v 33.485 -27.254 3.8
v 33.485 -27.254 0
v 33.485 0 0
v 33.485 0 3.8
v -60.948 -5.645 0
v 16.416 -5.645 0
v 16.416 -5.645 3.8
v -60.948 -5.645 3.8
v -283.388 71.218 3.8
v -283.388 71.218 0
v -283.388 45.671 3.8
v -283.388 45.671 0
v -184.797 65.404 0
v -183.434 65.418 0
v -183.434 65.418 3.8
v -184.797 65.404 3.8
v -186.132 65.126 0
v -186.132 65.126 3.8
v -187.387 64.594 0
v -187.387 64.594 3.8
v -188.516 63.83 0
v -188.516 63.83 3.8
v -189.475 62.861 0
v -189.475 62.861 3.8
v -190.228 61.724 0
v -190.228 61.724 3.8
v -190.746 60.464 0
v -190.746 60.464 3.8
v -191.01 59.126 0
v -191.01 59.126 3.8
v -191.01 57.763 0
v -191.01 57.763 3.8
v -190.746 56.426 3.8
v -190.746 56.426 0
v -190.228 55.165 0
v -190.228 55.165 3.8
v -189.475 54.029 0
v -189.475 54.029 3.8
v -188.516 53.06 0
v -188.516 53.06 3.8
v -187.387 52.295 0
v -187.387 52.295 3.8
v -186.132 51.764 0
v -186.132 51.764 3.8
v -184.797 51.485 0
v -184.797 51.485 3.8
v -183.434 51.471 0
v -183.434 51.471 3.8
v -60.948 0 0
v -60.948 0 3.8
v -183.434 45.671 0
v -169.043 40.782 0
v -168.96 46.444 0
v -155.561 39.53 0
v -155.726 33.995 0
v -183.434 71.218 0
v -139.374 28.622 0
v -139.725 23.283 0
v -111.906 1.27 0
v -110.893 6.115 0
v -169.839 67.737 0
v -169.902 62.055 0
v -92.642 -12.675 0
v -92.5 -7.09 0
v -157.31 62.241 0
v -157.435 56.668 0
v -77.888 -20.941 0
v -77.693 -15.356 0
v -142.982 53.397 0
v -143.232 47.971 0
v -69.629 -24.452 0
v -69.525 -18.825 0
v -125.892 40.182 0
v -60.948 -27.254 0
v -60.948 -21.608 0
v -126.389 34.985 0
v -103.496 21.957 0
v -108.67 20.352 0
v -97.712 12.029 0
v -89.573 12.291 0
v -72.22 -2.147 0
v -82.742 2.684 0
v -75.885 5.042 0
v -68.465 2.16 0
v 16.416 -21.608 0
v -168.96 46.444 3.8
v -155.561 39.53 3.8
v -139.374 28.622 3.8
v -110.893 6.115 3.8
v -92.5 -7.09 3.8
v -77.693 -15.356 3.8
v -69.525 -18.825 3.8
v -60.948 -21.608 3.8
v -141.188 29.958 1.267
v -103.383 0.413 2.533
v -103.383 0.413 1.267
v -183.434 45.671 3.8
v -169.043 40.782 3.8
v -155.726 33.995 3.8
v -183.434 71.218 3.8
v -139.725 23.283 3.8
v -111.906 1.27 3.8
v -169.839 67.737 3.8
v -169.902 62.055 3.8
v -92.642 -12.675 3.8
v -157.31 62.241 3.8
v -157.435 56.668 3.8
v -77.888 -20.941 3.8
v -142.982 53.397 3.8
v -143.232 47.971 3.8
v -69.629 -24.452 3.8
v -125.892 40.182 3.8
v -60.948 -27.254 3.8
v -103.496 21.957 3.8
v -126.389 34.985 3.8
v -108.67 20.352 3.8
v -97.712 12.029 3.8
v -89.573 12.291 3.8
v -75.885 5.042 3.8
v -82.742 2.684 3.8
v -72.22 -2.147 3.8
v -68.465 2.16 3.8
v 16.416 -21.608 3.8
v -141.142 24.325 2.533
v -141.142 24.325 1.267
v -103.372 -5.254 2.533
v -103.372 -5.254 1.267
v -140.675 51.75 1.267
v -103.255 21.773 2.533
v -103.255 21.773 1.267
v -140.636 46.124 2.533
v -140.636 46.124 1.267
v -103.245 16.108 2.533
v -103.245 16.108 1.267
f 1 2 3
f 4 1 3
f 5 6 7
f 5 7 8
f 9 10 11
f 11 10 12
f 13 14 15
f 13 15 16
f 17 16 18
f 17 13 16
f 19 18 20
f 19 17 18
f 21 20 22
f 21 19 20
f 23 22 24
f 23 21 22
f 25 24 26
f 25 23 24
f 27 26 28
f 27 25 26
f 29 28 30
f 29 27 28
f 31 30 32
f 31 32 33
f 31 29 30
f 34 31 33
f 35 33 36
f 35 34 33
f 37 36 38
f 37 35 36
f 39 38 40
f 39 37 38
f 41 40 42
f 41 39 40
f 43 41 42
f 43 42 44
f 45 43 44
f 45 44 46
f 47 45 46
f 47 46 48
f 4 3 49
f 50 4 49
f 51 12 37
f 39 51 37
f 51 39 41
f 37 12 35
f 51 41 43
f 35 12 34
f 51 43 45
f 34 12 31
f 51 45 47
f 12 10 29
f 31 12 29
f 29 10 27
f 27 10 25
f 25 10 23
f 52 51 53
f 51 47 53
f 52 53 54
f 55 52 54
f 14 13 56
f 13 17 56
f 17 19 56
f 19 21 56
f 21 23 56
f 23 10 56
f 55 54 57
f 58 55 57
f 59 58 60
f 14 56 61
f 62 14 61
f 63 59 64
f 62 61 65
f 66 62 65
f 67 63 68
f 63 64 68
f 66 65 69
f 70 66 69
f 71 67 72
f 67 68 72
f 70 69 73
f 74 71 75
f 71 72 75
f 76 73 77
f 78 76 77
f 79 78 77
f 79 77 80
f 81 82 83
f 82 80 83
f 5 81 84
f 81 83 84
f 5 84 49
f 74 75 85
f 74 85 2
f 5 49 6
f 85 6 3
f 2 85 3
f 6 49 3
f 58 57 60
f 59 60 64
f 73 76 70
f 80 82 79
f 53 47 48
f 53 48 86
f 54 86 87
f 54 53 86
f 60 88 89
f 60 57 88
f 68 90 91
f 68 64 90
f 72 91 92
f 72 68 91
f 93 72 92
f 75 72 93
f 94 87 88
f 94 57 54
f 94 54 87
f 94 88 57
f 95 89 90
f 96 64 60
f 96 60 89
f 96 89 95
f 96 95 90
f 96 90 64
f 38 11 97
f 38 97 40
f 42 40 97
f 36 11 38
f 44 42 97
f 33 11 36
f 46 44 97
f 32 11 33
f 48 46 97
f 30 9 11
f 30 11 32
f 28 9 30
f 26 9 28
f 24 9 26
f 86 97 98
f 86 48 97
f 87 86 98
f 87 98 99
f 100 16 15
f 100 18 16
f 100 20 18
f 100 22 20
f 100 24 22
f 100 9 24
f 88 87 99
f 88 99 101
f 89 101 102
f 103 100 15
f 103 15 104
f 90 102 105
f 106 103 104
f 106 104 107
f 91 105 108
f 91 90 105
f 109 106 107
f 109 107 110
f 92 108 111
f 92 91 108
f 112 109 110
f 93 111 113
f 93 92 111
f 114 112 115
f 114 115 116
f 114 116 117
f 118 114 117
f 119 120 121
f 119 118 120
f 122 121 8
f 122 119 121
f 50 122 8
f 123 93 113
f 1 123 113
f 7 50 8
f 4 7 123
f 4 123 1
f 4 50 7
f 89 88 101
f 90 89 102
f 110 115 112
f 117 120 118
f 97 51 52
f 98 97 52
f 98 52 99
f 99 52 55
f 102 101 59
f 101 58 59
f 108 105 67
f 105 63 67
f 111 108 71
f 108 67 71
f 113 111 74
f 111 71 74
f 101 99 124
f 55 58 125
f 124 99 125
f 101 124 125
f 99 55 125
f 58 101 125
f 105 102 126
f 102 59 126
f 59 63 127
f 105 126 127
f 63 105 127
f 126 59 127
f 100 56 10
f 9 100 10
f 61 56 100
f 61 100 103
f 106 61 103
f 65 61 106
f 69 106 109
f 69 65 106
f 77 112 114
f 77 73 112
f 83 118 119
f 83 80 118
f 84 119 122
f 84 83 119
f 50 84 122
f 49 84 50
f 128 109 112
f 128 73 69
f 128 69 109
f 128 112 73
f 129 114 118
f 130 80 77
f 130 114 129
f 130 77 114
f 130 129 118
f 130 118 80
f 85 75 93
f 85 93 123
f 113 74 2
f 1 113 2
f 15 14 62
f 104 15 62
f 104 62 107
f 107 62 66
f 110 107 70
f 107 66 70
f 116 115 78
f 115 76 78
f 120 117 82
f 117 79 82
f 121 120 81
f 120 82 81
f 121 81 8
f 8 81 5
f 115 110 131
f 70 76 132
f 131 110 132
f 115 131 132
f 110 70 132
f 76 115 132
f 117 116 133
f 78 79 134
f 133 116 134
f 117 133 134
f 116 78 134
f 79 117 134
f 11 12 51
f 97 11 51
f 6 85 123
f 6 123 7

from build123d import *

# Parameters (mm, degrees)
BOSS_EXTRUDE1_DEPTH = 3.8


with BuildPart() as part:
    # Sketch1 → Boss-Extrude1 (new body)
    with BuildSketch(Plane.XY):
        with BuildLine():
            Line((-183.434400527, 71.218162808), (-283.388111119, 71.218162808))
            Line((-283.388111119, 71.218162808), (-283.388111119, 45.671242369))
            Line((-283.388111119, 45.671242369), (-183.434400527, 45.671242369))
            add(Edge.make_bspline(
                [(-183.434400527, 45.671242369), (-135.823073525, 33.710571784), (-108.755954443, -14.312606995), (-60.948326307, -27.25367588)],
                knots=[0, 0, 0, 0, 1, 1, 1, 1], degree=3))
            Line((-60.948326307, -27.25367588), (33.485476227, -27.25367588))
            Line((33.485476227, -27.25367588), (33.485476227, 0))
            Line((33.485476227, 0), (-60.948326307, 0))
            add(Edge.make_bspline(
                [(-183.434400527, 71.218162808), (-134.596760432, 63.241960011), (-109.105838052, 11.434490967), (-60.948326307, 0)],
                knots=[0, 0, 0, 0, 1, 1, 1, 1], degree=3))
        make_face()
        with BuildLine():
            Line((16.41594826, -5.645404289), (-60.948326307, -5.645404289))
            add(Edge.make_bspline(
                [(-183.434400527, 65.418162808), (-134.494216102, 57.813087075), (-109.135947228, 5.64820533), (-60.948326307, -5.645404289)],
                knots=[0, 0, 0, 0, 1, 1, 1, 1], degree=3))
            ThreePointArc((-183.434400527, 65.418162808), (-191.043377182, 58.444702588), (-183.434400527, 51.471242369))
            add(Edge.make_bspline(
                [(-183.434400527, 51.471242369), (-135.942087972, 39.160056631), (-108.723006617, -8.535375407), (-60.948326307, -21.608271591)],
                knots=[0, 0, 0, 0, 1, 1, 1, 1], degree=3))
            Line((-60.948326307, -21.608271591), (16.41594826, -21.608271591))
            Line((16.41594826, -21.608271591), (16.41594826, -5.645404289))
        make_face(mode=Mode.SUBTRACT)
    extrude(amount=BOSS_EXTRUDE1_DEPTH)


solid = part.part
